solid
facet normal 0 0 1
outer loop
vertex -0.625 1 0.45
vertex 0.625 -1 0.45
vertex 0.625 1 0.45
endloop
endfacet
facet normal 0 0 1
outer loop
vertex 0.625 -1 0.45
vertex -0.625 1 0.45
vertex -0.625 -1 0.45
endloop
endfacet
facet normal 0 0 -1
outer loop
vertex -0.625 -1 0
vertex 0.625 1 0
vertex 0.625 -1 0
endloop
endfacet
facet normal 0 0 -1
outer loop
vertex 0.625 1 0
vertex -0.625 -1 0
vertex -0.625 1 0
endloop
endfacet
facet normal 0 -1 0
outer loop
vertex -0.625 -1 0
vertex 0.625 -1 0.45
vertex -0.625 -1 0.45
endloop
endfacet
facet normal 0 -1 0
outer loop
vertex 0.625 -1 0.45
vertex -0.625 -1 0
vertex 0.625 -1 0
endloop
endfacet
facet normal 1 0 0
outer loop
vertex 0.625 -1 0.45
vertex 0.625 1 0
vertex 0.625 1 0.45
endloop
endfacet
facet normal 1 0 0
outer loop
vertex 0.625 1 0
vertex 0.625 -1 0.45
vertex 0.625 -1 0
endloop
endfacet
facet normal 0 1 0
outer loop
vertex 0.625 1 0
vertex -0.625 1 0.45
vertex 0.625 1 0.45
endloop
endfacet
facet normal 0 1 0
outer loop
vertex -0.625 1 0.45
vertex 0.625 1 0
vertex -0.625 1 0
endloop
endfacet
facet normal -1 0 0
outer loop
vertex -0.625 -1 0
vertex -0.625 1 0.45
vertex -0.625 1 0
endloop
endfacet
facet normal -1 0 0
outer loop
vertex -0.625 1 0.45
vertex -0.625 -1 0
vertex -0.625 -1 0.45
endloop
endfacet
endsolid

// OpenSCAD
/*
 * Create a 0805 size case
 *
 * Author: Ian McInerney
 * Created: March 19, 2015
 */

// The case
translate([0, 0, 0.45/2]){
	cube(size=[1.25,2.0,0.45], center=true);
}
